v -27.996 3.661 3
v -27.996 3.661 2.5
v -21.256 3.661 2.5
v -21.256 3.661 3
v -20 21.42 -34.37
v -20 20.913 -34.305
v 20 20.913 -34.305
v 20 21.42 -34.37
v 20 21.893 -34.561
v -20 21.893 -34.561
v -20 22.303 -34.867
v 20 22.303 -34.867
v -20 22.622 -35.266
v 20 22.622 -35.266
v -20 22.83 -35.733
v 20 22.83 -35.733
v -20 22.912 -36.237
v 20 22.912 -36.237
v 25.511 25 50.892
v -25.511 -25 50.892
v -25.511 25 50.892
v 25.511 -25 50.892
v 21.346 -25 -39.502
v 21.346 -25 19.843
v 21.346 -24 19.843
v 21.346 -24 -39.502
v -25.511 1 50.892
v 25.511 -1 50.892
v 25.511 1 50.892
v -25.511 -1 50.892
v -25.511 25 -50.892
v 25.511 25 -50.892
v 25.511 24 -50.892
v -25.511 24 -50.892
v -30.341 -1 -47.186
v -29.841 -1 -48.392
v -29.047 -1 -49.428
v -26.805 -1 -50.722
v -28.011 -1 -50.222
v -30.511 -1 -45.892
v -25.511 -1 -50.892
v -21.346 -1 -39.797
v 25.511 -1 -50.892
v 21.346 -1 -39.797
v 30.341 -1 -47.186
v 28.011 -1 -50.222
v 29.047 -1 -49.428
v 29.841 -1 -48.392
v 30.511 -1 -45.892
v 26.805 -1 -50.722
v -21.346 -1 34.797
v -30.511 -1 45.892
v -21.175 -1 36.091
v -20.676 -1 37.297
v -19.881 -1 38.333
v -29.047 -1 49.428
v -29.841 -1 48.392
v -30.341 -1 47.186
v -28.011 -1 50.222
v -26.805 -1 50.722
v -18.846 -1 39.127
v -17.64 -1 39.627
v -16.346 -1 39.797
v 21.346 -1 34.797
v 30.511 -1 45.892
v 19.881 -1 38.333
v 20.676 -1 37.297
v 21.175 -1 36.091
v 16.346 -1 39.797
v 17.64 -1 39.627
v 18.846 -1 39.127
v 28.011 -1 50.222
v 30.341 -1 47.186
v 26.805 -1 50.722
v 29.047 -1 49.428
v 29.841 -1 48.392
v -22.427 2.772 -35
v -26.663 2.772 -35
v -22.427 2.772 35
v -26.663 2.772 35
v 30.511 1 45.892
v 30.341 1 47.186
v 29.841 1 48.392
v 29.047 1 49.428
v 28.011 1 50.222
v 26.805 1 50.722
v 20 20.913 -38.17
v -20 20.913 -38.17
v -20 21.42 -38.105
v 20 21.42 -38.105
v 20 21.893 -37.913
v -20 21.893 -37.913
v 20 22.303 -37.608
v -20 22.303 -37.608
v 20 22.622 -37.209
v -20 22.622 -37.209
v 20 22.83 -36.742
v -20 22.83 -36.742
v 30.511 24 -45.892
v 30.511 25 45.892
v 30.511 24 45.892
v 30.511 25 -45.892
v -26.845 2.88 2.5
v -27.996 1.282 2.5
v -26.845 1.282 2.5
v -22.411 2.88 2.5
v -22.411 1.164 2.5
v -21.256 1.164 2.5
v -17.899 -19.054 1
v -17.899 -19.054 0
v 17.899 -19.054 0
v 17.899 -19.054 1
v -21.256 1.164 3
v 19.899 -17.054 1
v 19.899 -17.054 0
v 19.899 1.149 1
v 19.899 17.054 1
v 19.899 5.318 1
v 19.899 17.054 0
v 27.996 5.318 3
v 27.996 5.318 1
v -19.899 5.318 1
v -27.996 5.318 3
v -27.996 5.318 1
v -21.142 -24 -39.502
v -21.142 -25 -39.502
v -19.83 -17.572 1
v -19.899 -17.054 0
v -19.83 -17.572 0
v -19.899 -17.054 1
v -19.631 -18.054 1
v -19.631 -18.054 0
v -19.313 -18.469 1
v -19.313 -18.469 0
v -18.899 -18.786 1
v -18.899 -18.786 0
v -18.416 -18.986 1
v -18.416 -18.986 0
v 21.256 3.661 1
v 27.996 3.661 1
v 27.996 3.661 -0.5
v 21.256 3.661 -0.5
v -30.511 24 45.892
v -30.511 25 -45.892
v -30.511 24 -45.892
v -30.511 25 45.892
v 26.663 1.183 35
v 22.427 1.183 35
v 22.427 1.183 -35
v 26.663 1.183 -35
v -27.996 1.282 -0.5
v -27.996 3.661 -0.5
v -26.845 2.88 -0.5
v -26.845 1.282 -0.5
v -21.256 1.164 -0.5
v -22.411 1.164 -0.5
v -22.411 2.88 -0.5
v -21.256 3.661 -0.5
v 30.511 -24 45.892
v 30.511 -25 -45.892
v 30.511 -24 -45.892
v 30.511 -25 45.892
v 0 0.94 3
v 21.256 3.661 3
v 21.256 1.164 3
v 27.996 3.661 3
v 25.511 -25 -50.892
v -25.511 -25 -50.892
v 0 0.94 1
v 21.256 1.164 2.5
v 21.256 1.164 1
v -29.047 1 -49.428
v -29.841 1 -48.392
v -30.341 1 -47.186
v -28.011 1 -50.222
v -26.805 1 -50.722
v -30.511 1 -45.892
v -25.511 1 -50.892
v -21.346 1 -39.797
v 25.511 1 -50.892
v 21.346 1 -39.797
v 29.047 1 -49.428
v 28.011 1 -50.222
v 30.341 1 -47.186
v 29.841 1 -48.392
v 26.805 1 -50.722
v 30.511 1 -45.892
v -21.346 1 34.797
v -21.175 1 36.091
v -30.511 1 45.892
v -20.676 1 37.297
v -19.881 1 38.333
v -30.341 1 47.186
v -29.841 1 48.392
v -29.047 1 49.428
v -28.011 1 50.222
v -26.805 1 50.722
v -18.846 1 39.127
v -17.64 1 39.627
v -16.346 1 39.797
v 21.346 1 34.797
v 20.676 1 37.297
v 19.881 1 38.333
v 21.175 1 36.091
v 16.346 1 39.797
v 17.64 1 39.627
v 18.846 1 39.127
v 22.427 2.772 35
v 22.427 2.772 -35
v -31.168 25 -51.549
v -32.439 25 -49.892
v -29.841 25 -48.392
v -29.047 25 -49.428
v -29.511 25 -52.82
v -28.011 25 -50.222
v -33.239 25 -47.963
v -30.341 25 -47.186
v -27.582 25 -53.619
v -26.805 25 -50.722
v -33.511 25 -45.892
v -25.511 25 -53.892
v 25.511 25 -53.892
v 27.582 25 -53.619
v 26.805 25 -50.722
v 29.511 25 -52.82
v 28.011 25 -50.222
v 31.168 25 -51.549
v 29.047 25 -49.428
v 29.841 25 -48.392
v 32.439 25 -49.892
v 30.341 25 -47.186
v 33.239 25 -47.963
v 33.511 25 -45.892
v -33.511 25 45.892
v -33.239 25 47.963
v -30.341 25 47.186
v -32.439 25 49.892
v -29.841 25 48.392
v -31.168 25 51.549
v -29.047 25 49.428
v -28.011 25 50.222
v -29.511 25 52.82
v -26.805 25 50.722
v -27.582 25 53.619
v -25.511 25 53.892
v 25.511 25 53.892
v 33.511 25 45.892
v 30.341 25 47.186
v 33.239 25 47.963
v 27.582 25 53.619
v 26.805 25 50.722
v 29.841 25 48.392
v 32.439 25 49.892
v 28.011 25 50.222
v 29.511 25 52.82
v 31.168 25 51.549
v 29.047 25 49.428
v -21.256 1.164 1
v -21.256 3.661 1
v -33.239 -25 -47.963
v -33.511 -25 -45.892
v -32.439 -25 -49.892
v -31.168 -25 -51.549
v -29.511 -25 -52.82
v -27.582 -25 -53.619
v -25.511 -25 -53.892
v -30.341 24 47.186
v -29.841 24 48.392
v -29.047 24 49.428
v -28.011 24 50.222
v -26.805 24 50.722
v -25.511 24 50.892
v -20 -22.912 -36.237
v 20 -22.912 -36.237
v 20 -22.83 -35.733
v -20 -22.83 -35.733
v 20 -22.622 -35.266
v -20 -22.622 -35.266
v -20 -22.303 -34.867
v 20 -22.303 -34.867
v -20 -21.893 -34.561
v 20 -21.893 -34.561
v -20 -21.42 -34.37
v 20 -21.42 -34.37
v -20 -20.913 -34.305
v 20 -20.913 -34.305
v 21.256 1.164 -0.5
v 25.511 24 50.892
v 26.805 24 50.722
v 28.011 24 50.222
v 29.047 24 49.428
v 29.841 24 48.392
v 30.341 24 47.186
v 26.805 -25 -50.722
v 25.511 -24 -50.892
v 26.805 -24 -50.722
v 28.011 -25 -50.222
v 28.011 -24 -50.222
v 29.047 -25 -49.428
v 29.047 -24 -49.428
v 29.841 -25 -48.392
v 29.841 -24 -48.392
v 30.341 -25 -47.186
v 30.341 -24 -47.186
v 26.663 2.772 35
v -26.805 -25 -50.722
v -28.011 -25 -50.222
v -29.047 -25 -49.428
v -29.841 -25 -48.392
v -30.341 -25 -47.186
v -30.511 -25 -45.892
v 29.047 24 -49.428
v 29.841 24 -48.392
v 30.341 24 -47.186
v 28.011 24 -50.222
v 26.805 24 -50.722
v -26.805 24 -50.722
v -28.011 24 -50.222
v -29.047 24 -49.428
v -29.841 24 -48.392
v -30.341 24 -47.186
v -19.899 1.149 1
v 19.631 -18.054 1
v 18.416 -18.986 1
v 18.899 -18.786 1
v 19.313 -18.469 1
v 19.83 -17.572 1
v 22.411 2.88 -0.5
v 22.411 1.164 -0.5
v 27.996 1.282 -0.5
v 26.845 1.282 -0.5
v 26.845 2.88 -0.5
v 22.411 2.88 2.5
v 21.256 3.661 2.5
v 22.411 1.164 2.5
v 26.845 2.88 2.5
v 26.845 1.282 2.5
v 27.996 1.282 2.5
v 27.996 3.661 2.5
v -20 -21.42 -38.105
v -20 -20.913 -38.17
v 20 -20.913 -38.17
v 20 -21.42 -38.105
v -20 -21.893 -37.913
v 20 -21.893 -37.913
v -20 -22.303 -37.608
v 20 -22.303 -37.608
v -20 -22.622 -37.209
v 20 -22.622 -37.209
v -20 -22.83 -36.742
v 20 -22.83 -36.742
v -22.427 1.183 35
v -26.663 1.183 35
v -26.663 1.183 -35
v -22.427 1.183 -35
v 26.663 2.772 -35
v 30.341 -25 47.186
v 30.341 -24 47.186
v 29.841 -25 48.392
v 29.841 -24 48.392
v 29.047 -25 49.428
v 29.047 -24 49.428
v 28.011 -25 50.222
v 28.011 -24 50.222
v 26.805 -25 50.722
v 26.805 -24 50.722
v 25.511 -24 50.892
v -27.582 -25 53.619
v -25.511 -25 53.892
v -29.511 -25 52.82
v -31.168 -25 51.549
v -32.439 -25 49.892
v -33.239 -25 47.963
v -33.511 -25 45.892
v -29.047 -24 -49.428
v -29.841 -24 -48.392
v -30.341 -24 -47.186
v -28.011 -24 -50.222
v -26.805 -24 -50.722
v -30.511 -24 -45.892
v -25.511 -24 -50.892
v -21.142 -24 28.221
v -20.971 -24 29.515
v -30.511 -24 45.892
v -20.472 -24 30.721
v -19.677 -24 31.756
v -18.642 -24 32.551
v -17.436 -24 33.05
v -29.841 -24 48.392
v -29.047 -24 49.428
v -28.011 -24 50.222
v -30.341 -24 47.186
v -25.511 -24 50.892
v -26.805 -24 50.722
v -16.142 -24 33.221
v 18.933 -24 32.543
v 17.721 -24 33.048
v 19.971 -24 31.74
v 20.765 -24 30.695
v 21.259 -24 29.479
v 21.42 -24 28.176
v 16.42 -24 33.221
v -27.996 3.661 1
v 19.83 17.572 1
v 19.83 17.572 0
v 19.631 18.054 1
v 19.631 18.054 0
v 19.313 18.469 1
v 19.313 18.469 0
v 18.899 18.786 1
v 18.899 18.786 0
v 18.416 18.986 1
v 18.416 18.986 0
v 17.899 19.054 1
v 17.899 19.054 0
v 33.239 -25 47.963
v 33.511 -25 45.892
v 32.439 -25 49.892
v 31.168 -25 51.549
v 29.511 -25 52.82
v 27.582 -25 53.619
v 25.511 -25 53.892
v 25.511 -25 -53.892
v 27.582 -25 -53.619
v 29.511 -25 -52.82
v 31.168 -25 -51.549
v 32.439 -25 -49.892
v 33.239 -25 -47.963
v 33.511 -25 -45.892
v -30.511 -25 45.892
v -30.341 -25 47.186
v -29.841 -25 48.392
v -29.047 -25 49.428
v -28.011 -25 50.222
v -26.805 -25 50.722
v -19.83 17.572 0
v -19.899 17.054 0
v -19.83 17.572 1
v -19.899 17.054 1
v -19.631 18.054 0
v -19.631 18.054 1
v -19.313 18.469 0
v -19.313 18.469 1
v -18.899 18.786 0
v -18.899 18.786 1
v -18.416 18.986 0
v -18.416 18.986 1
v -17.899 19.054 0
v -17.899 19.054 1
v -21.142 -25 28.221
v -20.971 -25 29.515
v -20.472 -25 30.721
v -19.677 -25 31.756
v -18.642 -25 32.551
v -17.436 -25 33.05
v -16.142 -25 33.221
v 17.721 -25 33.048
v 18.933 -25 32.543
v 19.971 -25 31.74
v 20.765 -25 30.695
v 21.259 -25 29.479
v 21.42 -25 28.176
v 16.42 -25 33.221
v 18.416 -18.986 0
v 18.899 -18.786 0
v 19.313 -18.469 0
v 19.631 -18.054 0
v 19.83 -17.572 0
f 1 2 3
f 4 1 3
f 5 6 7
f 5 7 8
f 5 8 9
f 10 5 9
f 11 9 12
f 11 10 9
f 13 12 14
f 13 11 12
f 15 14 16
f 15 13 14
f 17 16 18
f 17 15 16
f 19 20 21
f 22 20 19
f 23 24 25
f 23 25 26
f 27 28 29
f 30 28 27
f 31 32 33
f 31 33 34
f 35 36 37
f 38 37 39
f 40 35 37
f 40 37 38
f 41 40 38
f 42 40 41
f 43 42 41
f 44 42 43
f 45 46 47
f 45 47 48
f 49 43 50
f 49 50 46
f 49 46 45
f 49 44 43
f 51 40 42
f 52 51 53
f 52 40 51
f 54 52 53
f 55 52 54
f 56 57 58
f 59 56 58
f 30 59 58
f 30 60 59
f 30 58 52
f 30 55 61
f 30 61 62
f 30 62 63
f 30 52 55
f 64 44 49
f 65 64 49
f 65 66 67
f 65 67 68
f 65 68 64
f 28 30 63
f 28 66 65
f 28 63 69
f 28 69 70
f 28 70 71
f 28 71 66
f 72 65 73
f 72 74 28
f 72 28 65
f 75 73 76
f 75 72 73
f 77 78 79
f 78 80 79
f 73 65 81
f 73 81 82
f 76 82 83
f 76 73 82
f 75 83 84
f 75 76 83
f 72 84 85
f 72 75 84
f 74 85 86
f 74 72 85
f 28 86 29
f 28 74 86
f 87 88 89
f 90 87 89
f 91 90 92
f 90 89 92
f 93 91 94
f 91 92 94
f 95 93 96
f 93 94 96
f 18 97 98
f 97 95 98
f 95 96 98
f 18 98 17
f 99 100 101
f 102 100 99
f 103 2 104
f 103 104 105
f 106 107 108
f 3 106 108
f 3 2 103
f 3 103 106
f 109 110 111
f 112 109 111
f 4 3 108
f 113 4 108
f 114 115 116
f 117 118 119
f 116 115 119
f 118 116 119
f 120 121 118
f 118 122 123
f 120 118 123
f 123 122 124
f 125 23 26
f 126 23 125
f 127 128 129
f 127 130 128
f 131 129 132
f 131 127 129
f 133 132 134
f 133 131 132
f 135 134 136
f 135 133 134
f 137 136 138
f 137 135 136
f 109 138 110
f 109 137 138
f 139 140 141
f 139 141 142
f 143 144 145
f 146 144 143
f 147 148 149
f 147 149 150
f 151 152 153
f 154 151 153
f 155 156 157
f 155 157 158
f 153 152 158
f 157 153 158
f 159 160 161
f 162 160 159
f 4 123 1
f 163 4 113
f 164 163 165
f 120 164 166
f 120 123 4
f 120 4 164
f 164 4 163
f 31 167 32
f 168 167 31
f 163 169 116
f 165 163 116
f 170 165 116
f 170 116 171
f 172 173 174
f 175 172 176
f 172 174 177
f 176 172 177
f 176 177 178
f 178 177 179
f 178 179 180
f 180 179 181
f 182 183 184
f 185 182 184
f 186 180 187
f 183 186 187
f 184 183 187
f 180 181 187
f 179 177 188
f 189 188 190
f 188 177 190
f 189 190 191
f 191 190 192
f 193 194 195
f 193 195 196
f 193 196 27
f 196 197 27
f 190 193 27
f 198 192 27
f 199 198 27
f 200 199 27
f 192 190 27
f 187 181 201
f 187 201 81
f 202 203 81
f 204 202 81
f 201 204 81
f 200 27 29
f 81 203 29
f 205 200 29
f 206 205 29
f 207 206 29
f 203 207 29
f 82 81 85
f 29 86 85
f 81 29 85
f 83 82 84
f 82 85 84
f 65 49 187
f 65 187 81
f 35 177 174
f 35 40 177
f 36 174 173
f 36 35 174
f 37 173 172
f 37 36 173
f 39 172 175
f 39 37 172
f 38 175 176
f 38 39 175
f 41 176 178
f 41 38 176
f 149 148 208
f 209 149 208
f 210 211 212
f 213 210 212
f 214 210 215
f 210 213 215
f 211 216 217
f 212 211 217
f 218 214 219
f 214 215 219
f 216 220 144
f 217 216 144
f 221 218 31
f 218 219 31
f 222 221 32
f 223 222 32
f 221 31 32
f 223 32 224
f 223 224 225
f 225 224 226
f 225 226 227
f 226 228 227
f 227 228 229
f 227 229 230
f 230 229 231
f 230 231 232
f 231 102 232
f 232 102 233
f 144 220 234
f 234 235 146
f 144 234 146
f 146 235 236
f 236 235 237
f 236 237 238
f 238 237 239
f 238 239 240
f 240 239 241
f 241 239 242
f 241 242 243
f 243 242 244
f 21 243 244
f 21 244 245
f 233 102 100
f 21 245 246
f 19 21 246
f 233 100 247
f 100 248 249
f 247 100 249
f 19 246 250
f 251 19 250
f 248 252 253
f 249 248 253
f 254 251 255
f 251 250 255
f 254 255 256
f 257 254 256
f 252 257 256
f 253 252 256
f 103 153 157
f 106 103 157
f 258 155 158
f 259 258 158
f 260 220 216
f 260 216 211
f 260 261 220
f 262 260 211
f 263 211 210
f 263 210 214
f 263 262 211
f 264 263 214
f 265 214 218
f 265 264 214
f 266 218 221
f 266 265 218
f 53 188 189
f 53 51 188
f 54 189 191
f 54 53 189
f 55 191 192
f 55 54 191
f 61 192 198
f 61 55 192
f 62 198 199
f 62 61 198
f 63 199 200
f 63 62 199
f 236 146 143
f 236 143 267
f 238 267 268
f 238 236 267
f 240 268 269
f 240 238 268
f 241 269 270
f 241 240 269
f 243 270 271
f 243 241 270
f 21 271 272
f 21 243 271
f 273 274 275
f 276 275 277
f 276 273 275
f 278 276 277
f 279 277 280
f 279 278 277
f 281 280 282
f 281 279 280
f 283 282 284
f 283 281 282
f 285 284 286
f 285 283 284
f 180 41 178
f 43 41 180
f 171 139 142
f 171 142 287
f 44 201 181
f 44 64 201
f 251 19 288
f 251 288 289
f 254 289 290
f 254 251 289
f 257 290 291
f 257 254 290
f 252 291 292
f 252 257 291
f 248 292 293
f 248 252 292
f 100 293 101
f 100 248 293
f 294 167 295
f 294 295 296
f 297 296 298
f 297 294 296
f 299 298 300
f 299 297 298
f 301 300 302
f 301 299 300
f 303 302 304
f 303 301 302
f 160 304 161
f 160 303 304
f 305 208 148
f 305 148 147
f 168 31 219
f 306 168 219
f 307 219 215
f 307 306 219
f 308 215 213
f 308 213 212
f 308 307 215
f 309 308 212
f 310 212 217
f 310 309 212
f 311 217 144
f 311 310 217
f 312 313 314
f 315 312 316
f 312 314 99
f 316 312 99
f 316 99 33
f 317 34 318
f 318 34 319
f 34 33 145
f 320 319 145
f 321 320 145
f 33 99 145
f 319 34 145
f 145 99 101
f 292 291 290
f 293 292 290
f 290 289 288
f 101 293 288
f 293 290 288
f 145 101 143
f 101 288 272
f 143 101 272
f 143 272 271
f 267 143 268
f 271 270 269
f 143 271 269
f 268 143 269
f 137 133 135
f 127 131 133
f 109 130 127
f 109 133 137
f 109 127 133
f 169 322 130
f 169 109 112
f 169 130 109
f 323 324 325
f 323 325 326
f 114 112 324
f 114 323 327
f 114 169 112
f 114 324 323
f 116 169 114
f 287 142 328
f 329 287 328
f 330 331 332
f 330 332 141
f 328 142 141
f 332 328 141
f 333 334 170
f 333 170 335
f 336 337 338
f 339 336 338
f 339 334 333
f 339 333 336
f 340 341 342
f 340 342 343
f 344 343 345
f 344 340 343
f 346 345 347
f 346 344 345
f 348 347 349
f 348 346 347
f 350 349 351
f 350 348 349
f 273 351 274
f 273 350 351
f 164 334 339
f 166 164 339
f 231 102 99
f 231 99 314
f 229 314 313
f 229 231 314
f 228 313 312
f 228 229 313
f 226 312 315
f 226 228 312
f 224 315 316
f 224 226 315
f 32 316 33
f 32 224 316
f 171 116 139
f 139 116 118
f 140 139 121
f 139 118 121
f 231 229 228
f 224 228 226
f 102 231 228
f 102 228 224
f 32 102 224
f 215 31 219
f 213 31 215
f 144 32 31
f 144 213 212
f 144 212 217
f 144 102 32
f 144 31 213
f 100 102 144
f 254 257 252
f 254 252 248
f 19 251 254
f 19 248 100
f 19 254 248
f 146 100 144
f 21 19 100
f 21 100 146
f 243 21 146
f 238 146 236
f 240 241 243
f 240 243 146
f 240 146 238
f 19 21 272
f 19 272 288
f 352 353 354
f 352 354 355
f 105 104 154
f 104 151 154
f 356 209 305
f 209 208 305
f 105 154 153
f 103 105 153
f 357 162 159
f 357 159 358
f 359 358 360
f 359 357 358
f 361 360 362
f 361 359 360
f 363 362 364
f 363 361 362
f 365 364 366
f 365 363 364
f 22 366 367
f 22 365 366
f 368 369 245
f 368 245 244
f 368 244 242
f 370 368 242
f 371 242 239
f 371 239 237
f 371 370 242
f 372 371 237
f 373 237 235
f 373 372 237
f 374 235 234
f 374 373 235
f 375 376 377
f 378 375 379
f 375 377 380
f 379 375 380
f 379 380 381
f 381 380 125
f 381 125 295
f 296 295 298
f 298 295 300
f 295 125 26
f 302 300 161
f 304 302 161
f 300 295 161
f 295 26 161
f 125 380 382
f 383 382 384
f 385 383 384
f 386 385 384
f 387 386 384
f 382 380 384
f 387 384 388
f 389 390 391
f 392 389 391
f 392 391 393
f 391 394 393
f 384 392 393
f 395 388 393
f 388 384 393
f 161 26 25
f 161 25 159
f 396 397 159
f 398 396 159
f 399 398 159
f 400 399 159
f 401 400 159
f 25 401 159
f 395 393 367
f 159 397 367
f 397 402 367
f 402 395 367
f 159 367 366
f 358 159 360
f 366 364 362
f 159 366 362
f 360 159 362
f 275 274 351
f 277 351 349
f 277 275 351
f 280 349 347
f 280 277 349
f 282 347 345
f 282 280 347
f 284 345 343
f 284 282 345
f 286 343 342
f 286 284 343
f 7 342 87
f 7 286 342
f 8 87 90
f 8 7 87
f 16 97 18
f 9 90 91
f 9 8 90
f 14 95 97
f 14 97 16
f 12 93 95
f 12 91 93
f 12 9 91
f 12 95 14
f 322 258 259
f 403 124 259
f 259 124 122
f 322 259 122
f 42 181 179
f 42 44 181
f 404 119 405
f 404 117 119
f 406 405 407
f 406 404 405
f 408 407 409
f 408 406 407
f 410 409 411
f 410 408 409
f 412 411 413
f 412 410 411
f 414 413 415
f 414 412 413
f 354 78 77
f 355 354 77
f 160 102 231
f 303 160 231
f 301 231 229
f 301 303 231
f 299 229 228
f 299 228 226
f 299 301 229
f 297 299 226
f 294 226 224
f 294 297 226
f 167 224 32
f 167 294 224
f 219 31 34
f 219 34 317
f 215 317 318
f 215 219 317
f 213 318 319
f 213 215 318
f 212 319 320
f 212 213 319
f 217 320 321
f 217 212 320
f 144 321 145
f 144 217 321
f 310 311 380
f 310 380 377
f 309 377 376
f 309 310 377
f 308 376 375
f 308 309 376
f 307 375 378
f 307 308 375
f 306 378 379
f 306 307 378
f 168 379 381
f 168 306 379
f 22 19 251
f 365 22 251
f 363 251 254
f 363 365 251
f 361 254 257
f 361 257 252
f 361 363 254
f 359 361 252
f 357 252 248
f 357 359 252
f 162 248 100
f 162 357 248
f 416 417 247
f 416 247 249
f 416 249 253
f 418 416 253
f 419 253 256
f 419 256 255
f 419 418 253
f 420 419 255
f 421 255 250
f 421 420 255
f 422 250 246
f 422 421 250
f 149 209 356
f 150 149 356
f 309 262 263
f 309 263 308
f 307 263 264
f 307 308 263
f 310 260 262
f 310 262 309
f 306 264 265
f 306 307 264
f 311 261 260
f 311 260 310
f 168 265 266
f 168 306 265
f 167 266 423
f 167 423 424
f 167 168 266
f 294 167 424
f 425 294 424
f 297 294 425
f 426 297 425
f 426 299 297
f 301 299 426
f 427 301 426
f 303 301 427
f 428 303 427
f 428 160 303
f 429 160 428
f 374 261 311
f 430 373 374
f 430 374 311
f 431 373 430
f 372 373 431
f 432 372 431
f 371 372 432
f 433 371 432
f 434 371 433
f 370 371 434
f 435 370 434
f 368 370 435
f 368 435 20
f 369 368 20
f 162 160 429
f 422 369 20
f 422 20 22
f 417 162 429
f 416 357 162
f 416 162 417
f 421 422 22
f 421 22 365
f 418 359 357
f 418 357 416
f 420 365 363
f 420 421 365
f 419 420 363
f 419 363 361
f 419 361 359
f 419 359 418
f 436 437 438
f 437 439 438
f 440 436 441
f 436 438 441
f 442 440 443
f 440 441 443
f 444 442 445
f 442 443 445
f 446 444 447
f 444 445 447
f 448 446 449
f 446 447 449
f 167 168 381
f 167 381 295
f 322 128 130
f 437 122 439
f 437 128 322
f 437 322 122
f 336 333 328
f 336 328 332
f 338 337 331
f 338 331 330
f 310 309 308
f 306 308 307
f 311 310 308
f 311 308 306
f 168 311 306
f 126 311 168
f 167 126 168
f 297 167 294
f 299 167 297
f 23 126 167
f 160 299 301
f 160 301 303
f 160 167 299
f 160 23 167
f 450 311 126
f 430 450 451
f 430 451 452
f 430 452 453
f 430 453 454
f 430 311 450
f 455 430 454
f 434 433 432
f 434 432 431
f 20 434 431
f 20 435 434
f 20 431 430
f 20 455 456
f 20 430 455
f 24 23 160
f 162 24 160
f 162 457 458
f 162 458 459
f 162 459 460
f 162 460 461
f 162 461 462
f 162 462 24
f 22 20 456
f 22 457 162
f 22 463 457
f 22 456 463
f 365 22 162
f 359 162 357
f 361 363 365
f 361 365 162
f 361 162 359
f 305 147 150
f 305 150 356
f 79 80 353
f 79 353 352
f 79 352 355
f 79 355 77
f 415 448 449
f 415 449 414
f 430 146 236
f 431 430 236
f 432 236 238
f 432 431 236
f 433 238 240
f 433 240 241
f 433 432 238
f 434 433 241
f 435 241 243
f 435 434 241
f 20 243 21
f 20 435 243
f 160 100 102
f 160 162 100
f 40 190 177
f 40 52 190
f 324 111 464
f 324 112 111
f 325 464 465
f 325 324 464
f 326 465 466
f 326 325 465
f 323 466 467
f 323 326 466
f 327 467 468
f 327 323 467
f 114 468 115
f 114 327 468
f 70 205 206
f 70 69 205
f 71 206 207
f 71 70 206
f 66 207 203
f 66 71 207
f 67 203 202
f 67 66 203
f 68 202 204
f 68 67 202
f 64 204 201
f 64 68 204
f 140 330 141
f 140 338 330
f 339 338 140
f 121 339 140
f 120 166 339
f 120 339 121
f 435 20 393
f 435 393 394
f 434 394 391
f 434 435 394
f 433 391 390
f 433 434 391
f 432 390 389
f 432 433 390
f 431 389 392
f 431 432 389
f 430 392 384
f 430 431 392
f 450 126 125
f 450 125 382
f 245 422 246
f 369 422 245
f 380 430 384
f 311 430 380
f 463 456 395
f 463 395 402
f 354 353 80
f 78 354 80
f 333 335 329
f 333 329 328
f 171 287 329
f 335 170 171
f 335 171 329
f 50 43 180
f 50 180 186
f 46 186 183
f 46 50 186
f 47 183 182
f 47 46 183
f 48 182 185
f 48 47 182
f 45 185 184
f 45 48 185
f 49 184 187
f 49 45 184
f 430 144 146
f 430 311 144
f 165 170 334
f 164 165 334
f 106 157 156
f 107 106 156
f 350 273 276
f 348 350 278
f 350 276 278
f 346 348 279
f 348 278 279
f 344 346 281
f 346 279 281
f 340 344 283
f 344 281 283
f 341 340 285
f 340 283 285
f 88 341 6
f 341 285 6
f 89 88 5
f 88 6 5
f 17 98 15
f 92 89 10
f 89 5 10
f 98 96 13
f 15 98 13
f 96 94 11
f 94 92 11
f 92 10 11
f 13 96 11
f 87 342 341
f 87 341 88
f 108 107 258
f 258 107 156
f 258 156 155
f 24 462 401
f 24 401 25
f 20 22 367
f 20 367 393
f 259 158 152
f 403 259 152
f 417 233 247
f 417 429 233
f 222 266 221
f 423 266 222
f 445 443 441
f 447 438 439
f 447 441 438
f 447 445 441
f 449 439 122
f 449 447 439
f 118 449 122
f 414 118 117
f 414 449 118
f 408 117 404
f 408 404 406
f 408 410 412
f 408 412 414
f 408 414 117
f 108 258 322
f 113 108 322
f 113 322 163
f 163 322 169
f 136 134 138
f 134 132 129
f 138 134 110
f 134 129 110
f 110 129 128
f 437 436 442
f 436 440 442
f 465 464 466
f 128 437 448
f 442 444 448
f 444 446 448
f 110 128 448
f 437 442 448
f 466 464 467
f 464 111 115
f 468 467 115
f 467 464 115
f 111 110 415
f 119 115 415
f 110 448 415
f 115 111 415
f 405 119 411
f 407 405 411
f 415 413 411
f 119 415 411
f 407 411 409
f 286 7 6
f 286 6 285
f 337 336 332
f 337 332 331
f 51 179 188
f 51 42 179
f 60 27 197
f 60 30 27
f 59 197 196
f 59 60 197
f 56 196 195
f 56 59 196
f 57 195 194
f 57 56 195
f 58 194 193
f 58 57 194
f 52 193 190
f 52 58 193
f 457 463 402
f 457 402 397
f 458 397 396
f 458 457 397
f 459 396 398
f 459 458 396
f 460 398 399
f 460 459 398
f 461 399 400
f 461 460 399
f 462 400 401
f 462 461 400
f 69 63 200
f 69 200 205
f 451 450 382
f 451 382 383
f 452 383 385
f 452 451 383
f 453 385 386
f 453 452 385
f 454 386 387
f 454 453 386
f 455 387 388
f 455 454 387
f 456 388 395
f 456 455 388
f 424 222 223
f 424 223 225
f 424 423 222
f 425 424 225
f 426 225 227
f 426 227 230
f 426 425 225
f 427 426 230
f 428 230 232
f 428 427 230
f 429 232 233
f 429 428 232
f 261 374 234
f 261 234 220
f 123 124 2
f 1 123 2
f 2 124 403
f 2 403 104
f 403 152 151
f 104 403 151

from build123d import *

# Parameters (mm, degrees)
F1_DEPTH    = 1
F2_DEPTH    = 25
F4_DEPTH    = 1
F6_DEPTH    = 1
F8_DEPTH    = 20
F9_T1_DEPTH = 50
F10_W       = 4.2359828949
F10_H       = 1.5884938184
F11_DEPTH   = 35
F12_W       = 39.7970937192
F12_H       = 38.108728826
F13_DEPTH   = 1
F14_R       = 2
F16_DEPTH   = 2
F17_DEPTH   = 1.5


# Not quite as in the source:
# - a fillet or chamfer that OpenCascade refuses, or shapes differently, is made with other operations: its cross-section is extruded or revolved along the edge and cut away or added


with BuildPart() as f1:
    # F0 (on Front) → F1 (new body, symmetric)
    with BuildSketch(Plane.XZ):
        with BuildLine():
            Line((-25.5111035705, -50.8920401335), (25.5111035705, -50.8920401335))
            ThreePointArc((25.5111035705, -50.8920401335), (29.0466374764, -49.4275740394), (30.5111035705, -45.8920401335))
            Line((30.5111035705, -45.8920401335), (30.5111035705, 45.8920401335))
            ThreePointArc((30.5111035705, 45.8920401335), (29.0466374764, 49.4275740394), (25.5111035705, 50.8920401335))
            Line((25.5111035705, 50.8920401335), (-25.5111035705, 50.8920401335))
            ThreePointArc((-25.5111035705, 50.8920401335), (-29.0466374764, 49.4275740394), (-30.5111035705, 45.8920401335))
            Line((-30.5111035705, 45.8920401335), (-30.5111035705, -45.8920401335))
            ThreePointArc((-30.5111035705, -45.8920401335), (-29.0466374764, -49.4275740394), (-25.5111035705, -50.8920401335))
        make_face()
        with BuildLine():
            Line((-16.3457122445, 39.7970937192), (16.3457122445, 39.7970937192))
            ThreePointArc((16.3457122445, 39.7970937192), (19.8812461504, 38.3326276252), (21.3457122445, 34.7970937192))
            Line((21.3457122445, 34.7970937192), (21.3457122445, -39.7970937192))
            Line((21.3457122445, -39.7970937192), (-21.3457122445, -39.7970937192))
            Line((-21.3457122445, -39.7970937192), (-21.3457122445, 34.7970937192))
            ThreePointArc((-21.3457122445, 34.7970937192), (-19.8812461504, 38.3326276252), (-16.3457122445, 39.7970937192))
        make_face(mode=Mode.SUBTRACT)
    extrude(amount=F1_DEPTH, both=True)


with BuildPart() as f2:
    # F0 (on Front) → F2 (new body, symmetric)
    with BuildSketch(Plane.XZ):
        with BuildLine():
            Line((33.5111035705, -45.8920401335), (33.5111035705, 45.8920401335))
            ThreePointArc((33.5111035705, 45.8920401335), (31.16795782, 51.548894383), (25.5111035705, 53.8920401335))
            Line((25.5111035705, 53.8920401335), (-25.5111035705, 53.8920401335))
            ThreePointArc((-25.5111035705, 53.8920401335), (-31.16795782, 51.548894383), (-33.5111035705, 45.8920401335))
            Line((-33.5111035705, 45.8920401335), (-33.5111035705, -45.8920401335))
            ThreePointArc((-33.5111035705, -45.8920401335), (-31.16795782, -51.548894383), (-25.5111035705, -53.8920401335))
            Line((-25.5111035705, -53.8920401335), (25.5111035705, -53.8920401335))
            ThreePointArc((25.5111035705, -53.8920401335), (31.16795782, -51.548894383), (33.5111035705, -45.8920401335))
        make_face()
        with BuildLine():
            ThreePointArc((30.5111035705, -45.8920401335), (29.0466374764, -49.4275740394), (25.5111035705, -50.8920401335))
            Line((25.5111035705, -50.8920401335), (-25.5111035705, -50.8920401335))
            ThreePointArc((-25.5111035705, -50.8920401335), (-29.0466374764, -49.4275740394), (-30.5111035705, -45.8920401335))
            Line((-30.5111035705, -45.8920401335), (-30.5111035705, 45.8920401335))
            ThreePointArc((-30.5111035705, 45.8920401335), (-29.0466374764, 49.4275740394), (-25.5111035705, 50.8920401335))
            Line((-25.5111035705, 50.8920401335), (25.5111035705, 50.8920401335))
            ThreePointArc((25.5111035705, 50.8920401335), (29.0466374764, 49.4275740394), (30.5111035705, 45.8920401335))
            Line((30.5111035705, 45.8920401335), (30.5111035705, -45.8920401335))
        make_face(mode=Mode.SUBTRACT)
    extrude(amount=F2_DEPTH, both=True)


with BuildPart() as f4:
    # F3 (on face) → F4 (new body)
    with BuildSketch(Plane.XZ.offset(25)):
        with BuildLine():
            ThreePointArc((30.5111035705, 45.8920401335), (29.0466374764, 49.4275740394), (25.5111035705, 50.8920401335))
            Line((25.5111035705, 50.8920401335), (-25.5111035705, 50.8920401335))
            ThreePointArc((-25.5111035705, 50.8920401335), (-29.0466374764, 49.4275740394), (-30.5111035705, 45.8920401335))
            Line((-30.5111035705, 45.8920401335), (-30.5111035705, -45.8920401335))
            ThreePointArc((-30.5111035705, -45.8920401335), (-29.0466374764, -49.4275740394), (-25.5111035705, -50.8920401335))
            Line((-25.5111035705, -50.8920401335), (25.5111035705, -50.8920401335))
            ThreePointArc((25.5111035705, -50.8920401335), (29.0466374764, -49.4275740394), (30.5111035705, -45.8920401335))
            Line((30.5111035705, -45.8920401335), (30.5111035705, 45.8920401335))
        make_face()
        with BuildLine():
            Line((21.4197138017, 28.1762804146), (21.3457085192, 19.8430334032))
            Line((21.3457085192, 19.8430334032), (21.3457085192, -39.5023338497))
            Line((21.3457085192, -39.5023338497), (-21.1417768151, -39.5023338497))
            Line((-21.1417768151, -39.5023338497), (-21.1417768151, 19.8430334032))
            Line((-21.1417768151, 19.8430334032), (-21.1417768151, 28.2206822932))
            ThreePointArc((-21.1417768151, 28.2206822932), (-19.677310721, 31.7562161991), (-16.1417768151, 33.2206822932))
            Line((-16.1417768151, 33.2206822932), (16.4199109583, 33.2206822932))
            ThreePointArc((16.4199109583, 33.2206822932), (19.9711086009, 31.7404827568), (21.4197138017, 28.1762804146))
        make_face(mode=Mode.SUBTRACT)
    extrude(amount=-F4_DEPTH)


with BuildPart() as f6:
    # F5 (on face) → F6 (new body)
    with BuildSketch(Plane(origin=(0, 25, 0), x_dir=(-1, 0, 0), z_dir=(0, 1, 0))):
        with BuildLine():
            ThreePointArc((30.5111035705, 45.8920401335), (29.0466374764, 49.4275740394), (25.5111035705, 50.8920401335))
            Line((25.5111035705, 50.8920401335), (-25.5111035705, 50.8920401335))
            ThreePointArc((-25.5111035705, 50.8920401335), (-29.0466374764, 49.4275740394), (-30.5111035705, 45.8920401335))
            Line((-30.5111035705, 45.8920401335), (-30.5111035705, -45.8920401335))
            ThreePointArc((-30.5111035705, -45.8920401335), (-29.0466374764, -49.4275740394), (-25.5111035705, -50.8920401335))
            Line((-25.5111035705, -50.8920401335), (25.5111035705, -50.8920401335))
            ThreePointArc((25.5111035705, -50.8920401335), (29.0466374764, -49.4275740394), (30.5111035705, -45.8920401335))
            Line((30.5111035705, -45.8920401335), (30.5111035705, 45.8920401335))
        make_face()
    extrude(amount=-F6_DEPTH)


with BuildPart() as f8:
    # F7 (on Right) → F8 (new body, symmetric)
    with BuildSketch(Plane.YZ):
        Polygon((-22.9129418731, -38.1699390709), (0, -38.1699390709), (22.9129418731, -38.1699390709), (22.9129418731, -34.3046039343), (0, -34.3046039343), (-22.9129418731, -34.3046039343), align=None)
    extrude(amount=F8_DEPTH, both=True)

    # F9: fillet of radius 2 on 4 edges, made by hand

    # F9_s2 → F9_t1 (cut)
    with BuildSketch(Plane.YZ.offset(-25)):
        with BuildLine():
            ThreePointArc((-22.9129418731, -36.3046039343), (-22.3271554354, -34.8903903719), (-20.9129418731, -34.3046039343))
            Line((-20.9129418731, -34.3046039343), (-22.9129418731, -34.3046039343))
            Line((-22.9129418731, -34.3046039343), (-22.9129418731, -36.3046039343))
        make_face()
        with BuildLine():
            ThreePointArc((-20.9129418731, -38.1699390709), (-22.3271554354, -37.5841526333), (-22.9129418731, -36.1699390709))
            Line((-22.9129418731, -36.1699390709), (-22.9129418731, -38.1699390709))
            Line((-22.9129418731, -38.1699390709), (-20.9129418731, -38.1699390709))
        make_face()
        with BuildLine():
            ThreePointArc((20.9129418731, -34.3046039343), (22.3271554354, -34.8903903719), (22.9129418731, -36.3046039343))
            Line((22.9129418731, -36.3046039343), (22.9129418731, -34.3046039343))
            Line((22.9129418731, -34.3046039343), (20.9129418731, -34.3046039343))
        make_face()
        with BuildLine():
            ThreePointArc((20.9129418731, -38.1699390709), (22.3271554354, -37.5841526333), (22.9129418731, -36.1699390709))
            Line((22.9129418731, -36.1699390709), (22.9129418731, -38.1699390709))
            Line((22.9129418731, -38.1699390709), (20.9129418731, -38.1699390709))
        make_face()
    extrude(amount=F9_T1_DEPTH, mode=Mode.SUBTRACT)


with BuildPart() as f11:
    # F10 (on Top) → F11 (new body, symmetric)
    with BuildSketch(Plane.XY):
        with Locations((24.545153603, 1.9773821114)):
            Rectangle(F10_W, F10_H)
    extrude(amount=F11_DEPTH, both=True)


with BuildPart() as f11b:
    # F10 (on Top) → F11, piece 2 (new body, symmetric)
    with BuildSketch(Plane.XY):
        with Locations((-24.545153603, 1.9773821114)):
            Rectangle(F10_W, F10_H)
    extrude(amount=F11_DEPTH, both=True)


with BuildPart() as f13:
    # F12 (on Top) → F13 (new body)
    with BuildSketch(Plane.XY):
        Rectangle(F12_W, F12_H)
    extrude(amount=F13_DEPTH)

    # F14
    f14_edges = [f13.edges().sort_by_distance(p)[0] for p in [
        (19.898547, -19.054364, 0.5),
        (-19.898547, -19.054364, 0.5),
        (-19.898547, 19.054364, 0.5),
        (19.898547, 19.054364, 0.5),
    ]]
    fillet(f14_edges, radius=F14_R)

    # F15 (on face) → F16 (join)
    with BuildSketch(Plane.XY.offset(1)):
        Polygon((19.8985468596, 5.3184535354), (19.8985468596, 1.1494957364), (21.2562642992, 1.1638099095), (21.2562642992, 3.6611582618), (27.9961694032, 3.6611582618), (27.9961694032, 5.3184535354), align=None)
        Polygon((0, 5.3184535354), (0, 0.9397089016), (19.8985468596, 1.1494957364), (19.8985468596, 5.3184535354), align=None)
        Polygon((-19.8985468596, 5.3184535354), (-19.8985468596, 1.1494957364), (0, 0.9397089016), (0, 5.3184535354), align=None)
        Polygon((-21.2562642992, 3.6611582618), (-21.2562642992, 1.1638099095), (-19.8985468596, 1.1494957364), (-19.8985468596, 5.3184535354), (-27.9961694032, 5.3184535354), (-27.9961694032, 3.6611582618), align=None)
    extrude(amount=F16_DEPTH)

    # F15 (on face) → F17 (join, symmetric)
    with BuildSketch(Plane.XY.offset(1)):
        Polygon((-22.4111061543, 2.8803967871), (-22.4111061543, 1.1638099095), (-21.2562642992, 1.1638099095), (-21.2562642992, 3.6611582618), (-27.9961694032, 3.6611582618), (-27.9961694032, 1.2822989374), (-26.8449559808, 1.2822989374), (-26.8449559808, 2.8803967871), align=None)
        Polygon((21.2562642992, 3.6611582618), (21.2562642992, 1.1638099095), (22.4111061543, 1.1638099095), (22.4111061543, 2.8803967871), (26.8449559808, 2.8803967871), (26.8449559808, 1.2822989374), (27.9961694032, 1.2822989374), (27.9961694032, 3.6611582618), align=None)
    extrude(amount=F17_DEPTH, both=True)


solid = Compound([f1.part, f2.part, f4.part, f6.part, f8.part, f11.part, f11b.part, f13.part])
